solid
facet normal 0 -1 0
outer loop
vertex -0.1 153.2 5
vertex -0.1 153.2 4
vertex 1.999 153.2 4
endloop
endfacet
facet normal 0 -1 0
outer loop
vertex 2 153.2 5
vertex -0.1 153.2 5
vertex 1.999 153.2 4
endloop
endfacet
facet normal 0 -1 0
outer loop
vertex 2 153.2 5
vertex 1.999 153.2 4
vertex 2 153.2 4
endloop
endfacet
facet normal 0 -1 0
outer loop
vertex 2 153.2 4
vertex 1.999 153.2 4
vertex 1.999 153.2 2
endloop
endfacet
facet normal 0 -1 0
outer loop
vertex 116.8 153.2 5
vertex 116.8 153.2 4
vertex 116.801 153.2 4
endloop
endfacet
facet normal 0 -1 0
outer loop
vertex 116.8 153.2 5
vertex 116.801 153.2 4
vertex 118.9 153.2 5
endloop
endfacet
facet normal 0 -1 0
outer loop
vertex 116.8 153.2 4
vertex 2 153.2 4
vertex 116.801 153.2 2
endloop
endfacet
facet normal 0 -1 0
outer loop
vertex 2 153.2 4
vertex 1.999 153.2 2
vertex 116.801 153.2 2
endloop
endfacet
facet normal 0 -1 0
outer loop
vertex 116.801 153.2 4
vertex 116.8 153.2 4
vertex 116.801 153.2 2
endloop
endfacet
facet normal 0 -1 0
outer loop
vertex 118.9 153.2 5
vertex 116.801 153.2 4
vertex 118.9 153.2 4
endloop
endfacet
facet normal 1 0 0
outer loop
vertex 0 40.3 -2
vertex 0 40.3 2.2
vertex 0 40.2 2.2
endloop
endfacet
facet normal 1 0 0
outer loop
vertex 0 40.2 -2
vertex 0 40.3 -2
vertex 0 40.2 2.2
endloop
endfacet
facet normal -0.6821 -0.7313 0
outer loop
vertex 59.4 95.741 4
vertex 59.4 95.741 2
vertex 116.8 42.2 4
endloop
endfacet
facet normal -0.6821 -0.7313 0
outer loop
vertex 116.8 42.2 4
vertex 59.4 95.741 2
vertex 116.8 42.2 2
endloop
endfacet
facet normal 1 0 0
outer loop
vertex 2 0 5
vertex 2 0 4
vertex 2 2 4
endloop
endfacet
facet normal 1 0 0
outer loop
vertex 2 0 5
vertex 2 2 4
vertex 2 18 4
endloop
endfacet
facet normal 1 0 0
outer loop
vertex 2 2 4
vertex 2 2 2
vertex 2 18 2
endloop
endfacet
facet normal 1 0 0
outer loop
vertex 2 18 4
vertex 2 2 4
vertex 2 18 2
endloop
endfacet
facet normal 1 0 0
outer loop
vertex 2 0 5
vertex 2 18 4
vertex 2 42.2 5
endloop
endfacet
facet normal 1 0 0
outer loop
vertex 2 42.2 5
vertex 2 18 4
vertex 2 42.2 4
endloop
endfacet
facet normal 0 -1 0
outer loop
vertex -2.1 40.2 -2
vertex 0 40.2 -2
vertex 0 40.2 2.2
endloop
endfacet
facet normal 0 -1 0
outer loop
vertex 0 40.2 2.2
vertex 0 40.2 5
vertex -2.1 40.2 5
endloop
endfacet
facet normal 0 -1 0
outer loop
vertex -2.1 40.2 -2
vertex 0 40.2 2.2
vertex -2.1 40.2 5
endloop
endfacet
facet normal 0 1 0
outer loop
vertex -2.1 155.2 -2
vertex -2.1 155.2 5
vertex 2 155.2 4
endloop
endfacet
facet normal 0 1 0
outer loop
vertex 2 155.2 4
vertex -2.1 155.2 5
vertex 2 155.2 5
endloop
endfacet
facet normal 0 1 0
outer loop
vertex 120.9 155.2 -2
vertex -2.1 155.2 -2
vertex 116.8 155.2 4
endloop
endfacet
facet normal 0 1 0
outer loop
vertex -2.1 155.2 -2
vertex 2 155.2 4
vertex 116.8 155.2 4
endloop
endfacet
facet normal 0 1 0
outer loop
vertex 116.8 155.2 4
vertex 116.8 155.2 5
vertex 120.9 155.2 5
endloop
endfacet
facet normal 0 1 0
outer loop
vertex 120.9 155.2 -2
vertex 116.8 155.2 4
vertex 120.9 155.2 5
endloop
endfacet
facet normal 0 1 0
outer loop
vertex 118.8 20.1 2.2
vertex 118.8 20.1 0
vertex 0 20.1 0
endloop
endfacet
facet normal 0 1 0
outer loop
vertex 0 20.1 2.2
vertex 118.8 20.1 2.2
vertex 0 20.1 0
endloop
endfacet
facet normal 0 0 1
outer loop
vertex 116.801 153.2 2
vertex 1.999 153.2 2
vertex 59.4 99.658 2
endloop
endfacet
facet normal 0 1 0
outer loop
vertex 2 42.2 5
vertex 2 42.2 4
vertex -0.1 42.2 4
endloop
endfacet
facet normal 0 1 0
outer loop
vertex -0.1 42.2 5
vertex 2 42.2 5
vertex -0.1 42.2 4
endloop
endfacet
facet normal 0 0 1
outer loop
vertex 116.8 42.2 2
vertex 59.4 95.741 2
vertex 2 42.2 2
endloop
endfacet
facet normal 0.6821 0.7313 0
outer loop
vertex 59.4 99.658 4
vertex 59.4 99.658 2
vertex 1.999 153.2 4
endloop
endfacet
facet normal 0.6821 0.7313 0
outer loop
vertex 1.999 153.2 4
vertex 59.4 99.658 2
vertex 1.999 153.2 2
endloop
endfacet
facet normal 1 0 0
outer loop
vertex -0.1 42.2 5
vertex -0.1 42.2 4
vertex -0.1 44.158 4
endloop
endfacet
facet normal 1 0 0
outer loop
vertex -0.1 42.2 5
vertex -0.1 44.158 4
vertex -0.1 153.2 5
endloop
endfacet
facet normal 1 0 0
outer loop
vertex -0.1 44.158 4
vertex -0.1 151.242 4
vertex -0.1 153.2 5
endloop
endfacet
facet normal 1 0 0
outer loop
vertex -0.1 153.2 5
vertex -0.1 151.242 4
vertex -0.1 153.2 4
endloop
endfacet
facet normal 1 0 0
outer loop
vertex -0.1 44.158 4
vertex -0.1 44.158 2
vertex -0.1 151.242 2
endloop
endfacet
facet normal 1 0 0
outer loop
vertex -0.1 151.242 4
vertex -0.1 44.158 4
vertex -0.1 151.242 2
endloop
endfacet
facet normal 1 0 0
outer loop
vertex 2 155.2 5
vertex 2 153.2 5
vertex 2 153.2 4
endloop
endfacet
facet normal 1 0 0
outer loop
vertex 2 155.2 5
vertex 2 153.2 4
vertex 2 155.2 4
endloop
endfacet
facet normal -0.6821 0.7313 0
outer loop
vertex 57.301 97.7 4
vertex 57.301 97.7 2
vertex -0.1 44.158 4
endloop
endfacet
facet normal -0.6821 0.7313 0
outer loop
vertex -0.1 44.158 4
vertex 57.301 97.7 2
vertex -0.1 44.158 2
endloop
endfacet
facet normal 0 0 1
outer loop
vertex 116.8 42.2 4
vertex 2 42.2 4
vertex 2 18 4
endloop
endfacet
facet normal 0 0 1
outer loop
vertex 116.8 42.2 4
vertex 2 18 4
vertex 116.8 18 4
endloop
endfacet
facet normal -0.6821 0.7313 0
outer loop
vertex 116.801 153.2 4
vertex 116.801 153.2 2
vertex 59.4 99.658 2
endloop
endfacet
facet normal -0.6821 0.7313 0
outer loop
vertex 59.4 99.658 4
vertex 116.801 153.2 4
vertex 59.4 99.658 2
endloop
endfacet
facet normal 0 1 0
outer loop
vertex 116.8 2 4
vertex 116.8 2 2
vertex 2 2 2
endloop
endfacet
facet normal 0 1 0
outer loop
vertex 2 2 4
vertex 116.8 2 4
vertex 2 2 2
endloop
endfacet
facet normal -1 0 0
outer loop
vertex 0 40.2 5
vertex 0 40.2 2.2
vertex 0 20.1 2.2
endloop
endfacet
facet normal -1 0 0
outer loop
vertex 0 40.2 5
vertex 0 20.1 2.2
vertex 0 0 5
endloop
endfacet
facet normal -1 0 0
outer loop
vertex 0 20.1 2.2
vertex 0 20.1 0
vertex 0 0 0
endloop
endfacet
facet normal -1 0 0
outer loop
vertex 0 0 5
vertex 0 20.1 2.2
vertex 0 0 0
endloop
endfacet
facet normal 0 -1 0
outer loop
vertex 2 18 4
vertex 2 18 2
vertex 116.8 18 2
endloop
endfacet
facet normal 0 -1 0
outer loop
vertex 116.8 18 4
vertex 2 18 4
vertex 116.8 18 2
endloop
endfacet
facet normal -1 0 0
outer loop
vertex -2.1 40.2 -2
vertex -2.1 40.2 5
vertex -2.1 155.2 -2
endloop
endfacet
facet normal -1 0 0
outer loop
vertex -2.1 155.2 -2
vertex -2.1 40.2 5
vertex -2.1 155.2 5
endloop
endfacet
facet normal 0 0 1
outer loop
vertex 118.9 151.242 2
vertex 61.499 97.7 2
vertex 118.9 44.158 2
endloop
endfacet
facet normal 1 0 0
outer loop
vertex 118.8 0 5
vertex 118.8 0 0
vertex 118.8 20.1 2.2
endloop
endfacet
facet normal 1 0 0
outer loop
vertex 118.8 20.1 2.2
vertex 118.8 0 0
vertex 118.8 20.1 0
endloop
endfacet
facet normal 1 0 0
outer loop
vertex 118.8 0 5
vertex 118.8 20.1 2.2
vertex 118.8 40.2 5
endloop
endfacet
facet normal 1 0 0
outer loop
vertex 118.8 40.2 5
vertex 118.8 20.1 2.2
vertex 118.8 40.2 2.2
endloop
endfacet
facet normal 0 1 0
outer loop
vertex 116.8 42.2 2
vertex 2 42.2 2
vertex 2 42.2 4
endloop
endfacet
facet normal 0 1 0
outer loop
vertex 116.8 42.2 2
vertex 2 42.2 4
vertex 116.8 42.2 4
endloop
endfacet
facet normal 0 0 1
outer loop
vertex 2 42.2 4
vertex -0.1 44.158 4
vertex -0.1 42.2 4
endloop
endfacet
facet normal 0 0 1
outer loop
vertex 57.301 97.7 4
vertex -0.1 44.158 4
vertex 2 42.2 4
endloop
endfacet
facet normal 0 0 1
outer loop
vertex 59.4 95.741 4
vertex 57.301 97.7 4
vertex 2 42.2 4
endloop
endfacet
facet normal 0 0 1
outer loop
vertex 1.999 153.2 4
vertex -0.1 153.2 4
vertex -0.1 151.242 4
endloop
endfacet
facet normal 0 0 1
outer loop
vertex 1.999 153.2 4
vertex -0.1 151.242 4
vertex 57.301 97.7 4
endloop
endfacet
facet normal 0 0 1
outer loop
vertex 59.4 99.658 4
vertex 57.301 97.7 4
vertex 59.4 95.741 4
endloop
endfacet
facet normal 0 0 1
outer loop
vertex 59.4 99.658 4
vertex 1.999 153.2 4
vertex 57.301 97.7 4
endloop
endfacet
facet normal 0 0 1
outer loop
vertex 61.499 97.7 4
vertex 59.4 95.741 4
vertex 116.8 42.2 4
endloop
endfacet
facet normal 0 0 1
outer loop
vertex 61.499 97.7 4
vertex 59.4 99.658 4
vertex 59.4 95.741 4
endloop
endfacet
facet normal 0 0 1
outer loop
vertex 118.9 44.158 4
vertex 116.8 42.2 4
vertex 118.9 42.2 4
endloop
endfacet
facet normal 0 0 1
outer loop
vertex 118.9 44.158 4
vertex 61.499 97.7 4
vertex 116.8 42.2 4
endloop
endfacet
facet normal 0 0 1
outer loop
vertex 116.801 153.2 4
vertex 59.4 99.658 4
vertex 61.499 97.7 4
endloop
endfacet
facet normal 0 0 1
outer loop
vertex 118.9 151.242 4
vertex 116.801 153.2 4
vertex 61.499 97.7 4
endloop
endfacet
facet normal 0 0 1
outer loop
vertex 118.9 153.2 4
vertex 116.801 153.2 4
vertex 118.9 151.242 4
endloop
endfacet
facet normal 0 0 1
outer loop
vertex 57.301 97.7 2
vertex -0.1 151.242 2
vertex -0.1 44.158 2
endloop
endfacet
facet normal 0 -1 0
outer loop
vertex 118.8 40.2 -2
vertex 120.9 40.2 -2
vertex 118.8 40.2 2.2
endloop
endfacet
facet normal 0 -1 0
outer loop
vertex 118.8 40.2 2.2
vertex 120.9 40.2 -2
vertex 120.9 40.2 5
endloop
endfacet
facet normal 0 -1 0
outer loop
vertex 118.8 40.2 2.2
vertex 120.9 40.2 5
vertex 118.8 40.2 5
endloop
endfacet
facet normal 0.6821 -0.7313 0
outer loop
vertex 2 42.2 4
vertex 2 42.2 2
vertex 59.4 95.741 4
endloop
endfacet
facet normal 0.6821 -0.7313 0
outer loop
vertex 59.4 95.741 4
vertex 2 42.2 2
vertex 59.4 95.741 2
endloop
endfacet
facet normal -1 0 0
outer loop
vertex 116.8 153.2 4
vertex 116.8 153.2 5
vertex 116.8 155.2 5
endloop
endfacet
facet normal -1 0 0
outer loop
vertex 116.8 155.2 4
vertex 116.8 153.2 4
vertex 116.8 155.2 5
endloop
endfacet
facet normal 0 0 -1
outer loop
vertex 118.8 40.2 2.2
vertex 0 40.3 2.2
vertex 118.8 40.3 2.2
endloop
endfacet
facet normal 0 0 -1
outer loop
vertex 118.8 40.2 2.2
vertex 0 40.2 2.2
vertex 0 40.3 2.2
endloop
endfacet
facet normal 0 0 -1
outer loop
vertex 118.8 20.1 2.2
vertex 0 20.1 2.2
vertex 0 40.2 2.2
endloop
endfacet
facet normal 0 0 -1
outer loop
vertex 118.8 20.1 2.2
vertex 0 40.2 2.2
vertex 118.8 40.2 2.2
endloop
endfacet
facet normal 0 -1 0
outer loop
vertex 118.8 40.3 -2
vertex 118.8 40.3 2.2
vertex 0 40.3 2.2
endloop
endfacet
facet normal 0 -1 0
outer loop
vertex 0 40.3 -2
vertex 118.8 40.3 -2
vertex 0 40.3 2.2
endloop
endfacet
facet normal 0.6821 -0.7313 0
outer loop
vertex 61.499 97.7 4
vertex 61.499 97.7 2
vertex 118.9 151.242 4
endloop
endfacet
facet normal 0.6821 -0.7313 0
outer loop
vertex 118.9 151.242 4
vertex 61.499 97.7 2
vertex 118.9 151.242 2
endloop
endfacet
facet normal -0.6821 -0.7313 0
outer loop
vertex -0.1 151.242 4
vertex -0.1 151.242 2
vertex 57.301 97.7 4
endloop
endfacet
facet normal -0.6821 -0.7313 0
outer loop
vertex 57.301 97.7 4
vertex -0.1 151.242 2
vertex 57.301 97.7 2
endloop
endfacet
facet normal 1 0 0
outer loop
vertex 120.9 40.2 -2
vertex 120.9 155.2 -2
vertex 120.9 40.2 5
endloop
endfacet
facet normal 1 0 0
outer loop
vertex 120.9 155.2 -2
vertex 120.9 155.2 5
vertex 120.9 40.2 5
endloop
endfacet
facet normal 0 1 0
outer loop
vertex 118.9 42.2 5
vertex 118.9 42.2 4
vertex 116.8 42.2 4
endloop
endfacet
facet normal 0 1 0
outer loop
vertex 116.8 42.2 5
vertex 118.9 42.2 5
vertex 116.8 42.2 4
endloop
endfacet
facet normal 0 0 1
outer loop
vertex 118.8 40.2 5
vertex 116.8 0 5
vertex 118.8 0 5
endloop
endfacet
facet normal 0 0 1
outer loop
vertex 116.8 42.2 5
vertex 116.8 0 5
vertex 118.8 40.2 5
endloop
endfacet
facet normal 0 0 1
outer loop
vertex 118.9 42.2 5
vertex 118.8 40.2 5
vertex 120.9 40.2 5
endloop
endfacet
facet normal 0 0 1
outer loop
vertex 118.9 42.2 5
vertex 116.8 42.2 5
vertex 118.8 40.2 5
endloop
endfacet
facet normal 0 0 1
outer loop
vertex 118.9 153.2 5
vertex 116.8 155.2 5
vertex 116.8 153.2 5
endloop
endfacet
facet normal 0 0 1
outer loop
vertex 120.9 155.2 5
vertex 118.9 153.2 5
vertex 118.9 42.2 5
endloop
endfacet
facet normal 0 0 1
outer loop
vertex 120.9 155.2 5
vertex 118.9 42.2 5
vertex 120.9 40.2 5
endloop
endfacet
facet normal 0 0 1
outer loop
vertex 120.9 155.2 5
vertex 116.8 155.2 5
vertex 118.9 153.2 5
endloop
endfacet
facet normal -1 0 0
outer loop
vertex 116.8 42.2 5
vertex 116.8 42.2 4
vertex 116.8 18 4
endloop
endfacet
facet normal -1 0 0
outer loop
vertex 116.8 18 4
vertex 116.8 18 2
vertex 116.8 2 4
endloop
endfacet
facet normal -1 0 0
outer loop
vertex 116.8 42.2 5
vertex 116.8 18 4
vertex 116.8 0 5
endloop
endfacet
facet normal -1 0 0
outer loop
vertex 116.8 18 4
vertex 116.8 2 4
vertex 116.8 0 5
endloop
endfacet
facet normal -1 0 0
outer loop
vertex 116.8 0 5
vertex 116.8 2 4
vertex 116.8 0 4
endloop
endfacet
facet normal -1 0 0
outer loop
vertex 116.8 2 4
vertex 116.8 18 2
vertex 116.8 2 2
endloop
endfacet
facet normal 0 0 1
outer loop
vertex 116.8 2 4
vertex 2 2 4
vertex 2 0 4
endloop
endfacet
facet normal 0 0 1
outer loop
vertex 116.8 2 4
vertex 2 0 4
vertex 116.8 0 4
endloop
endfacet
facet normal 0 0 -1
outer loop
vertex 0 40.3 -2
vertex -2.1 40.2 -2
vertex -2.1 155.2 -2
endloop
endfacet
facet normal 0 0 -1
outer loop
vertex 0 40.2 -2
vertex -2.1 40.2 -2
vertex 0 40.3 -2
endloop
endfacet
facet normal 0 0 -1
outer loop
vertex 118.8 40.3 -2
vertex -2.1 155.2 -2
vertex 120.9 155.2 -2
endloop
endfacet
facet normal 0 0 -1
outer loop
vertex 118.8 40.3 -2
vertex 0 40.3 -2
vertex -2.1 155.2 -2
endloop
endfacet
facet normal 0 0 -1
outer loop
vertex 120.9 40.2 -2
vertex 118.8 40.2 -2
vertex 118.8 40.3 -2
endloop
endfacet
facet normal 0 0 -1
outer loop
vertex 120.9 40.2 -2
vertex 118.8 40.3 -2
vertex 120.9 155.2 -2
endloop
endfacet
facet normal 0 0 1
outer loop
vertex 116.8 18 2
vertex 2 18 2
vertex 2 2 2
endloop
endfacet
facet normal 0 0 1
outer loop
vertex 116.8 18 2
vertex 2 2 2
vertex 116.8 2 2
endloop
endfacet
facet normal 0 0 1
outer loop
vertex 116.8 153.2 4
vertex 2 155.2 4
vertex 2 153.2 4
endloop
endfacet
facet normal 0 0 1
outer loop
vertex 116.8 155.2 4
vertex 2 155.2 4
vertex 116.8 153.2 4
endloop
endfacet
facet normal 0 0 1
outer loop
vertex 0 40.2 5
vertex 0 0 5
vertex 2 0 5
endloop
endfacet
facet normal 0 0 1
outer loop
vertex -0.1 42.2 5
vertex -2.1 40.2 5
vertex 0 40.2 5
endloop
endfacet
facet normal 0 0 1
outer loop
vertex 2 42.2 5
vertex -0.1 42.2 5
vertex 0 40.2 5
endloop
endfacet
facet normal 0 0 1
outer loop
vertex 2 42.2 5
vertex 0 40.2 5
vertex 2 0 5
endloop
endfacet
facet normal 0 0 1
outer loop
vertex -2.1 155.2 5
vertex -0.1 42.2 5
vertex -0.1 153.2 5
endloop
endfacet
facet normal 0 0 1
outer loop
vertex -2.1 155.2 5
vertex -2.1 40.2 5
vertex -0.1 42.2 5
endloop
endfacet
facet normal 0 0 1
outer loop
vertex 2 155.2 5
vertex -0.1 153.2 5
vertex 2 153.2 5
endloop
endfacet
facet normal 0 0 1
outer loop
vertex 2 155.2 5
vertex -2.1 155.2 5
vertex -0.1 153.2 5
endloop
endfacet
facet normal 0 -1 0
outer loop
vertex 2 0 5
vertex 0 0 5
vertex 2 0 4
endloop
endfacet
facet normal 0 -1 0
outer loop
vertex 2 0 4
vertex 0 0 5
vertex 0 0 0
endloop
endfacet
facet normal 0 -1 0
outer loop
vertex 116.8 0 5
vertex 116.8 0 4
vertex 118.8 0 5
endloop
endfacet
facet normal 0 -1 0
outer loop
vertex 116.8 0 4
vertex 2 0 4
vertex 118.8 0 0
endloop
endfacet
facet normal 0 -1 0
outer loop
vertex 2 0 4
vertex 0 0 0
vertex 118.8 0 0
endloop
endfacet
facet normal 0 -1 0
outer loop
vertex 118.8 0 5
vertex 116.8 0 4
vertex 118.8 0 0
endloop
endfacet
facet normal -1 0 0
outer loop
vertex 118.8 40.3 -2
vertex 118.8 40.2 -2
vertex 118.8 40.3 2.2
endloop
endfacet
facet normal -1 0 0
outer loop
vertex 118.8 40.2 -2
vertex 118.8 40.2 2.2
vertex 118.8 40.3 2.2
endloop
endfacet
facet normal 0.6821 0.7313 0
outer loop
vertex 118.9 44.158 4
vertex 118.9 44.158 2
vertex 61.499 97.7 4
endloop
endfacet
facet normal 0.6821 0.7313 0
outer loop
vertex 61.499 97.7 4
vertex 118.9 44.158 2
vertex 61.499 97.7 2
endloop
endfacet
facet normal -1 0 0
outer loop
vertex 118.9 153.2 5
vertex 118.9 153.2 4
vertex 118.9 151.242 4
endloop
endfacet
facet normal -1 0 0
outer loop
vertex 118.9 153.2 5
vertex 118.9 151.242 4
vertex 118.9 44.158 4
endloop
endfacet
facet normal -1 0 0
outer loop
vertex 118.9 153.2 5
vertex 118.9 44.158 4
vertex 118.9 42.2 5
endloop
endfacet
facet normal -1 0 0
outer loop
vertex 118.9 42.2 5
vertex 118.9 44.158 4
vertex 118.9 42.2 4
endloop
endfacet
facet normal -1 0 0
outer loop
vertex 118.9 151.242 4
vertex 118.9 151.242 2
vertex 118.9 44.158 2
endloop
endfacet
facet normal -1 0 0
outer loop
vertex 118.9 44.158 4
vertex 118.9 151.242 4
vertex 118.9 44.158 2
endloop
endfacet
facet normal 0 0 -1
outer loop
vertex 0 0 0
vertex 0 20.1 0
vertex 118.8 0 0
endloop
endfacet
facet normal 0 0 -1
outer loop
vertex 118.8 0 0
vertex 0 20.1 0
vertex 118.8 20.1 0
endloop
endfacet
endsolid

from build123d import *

# Parameters (mm, degrees)
F1_DEPTH  = 2
F3_DEPTH  = 3
F4_W      = 114.8
F4_H      = 24.2
F5_DEPTH  = 2
F7_DEPTH  = 2.2
F8_W      = 114.8
F8_H      = 2
F9_DEPTH  = 1
F10_W     = 114.8
F10_H     = 2
F11_DEPTH = 1
F12_DEPTH = 2


with BuildPart() as f1:
    # F0 (on Top) → F1 (new body)
    with BuildSketch(Plane.XY):
        Polygon((0, 40.2), (0, 0), (118.8, 0), (118.8, 40.2), (120.9, 40.2), (120.9, 155.2), (-2.1, 155.2), (-2.1, 40.2), align=None)
    extrude(amount=F1_DEPTH)

    # F2 (on face) → F3 (join)
    with BuildSketch(Plane.XY.offset(2)):
        Polygon((-2.1, 40.2), (0, 40.2), (0, 0), (118.8, 0), (118.8, 40.2), (120.9, 40.2), (120.9, 155.2), (-2.1, 155.2), align=None)
        Polygon((2, 42.2), (-0.1, 42.2), (-0.1, 153.2), (118.9, 153.2), (118.9, 42.2), (116.8, 42.2), (116.8, 2), (2, 2), align=None, mode=Mode.SUBTRACT)
    extrude(amount=F3_DEPTH)

    # F4 (on face) → F5 (join)
    with BuildSketch(Plane.XY.offset(2)):
        with Locations((59.4, 30.1)):
            Rectangle(F4_W, F4_H)
        Polygon((-0.1, 42.2), (2, 42.2), (59.4, 95.741176), (116.8, 42.2), (118.9, 42.2), (59.4, 97.7), align=None)
        Polygon((59.4, 97.7), (118.9, 42.2), (118.9, 44.158265), (61.499401, 97.7), (118.9, 151.241735), (118.9, 153.2), align=None)
        Polygon((-0.1, 153.2), (59.4, 97.7), (118.9, 153.2), (116.800599, 153.2), (59.4, 99.658265), (1.999401, 153.2), align=None)
        Polygon((-0.1, 44.158265), (-0.1, 42.2), (59.4, 97.7), (-0.1, 153.2), (-0.1, 151.241735), (57.300599, 97.7), align=None)
    extrude(amount=F5_DEPTH)

    # F6 (on face) → F7 (cut)
    with BuildSketch(Plane(origin=(0, 0, 0), x_dir=(1, 0, 0), z_dir=(0, 0, -1))):
        Polygon((0, -40.3), (118.8, -40.3), (118.8, -40.2), (118.8, -20.1), (0, -20.1), (0, -40.2), align=None)
    extrude(amount=-F7_DEPTH, mode=Mode.SUBTRACT)

    # F8 (on face) → F9 (cut)
    with BuildSketch(Plane.XY.offset(5)):
        with Locations((59.4, 1)):
            Rectangle(F8_W, F8_H)
    extrude(amount=-F9_DEPTH, mode=Mode.SUBTRACT)

    # F10 (on face) → F11 (cut)
    with BuildSketch(Plane.XY.offset(5)):
        with Locations((59.4, 154.2)):
            Rectangle(F10_W, F10_H)
    extrude(amount=-F11_DEPTH, mode=Mode.SUBTRACT)

    # F7_face (on face) → F12 (join)
    with BuildSketch(Plane(origin=(59.4, 97.748291, 0), x_dir=(1, 0, 0), z_dir=(0, 0, -1))):
        Polygon((-59.4, 57.548291), (-61.5, 57.548291), (-61.5, -57.451709), (61.5, -57.451709), (61.5, 57.548291), (59.4, 57.548291), (59.4, 57.448291), (-59.4, 57.448291), align=None)
    extrude(amount=F12_DEPTH)


solid = f1.part
